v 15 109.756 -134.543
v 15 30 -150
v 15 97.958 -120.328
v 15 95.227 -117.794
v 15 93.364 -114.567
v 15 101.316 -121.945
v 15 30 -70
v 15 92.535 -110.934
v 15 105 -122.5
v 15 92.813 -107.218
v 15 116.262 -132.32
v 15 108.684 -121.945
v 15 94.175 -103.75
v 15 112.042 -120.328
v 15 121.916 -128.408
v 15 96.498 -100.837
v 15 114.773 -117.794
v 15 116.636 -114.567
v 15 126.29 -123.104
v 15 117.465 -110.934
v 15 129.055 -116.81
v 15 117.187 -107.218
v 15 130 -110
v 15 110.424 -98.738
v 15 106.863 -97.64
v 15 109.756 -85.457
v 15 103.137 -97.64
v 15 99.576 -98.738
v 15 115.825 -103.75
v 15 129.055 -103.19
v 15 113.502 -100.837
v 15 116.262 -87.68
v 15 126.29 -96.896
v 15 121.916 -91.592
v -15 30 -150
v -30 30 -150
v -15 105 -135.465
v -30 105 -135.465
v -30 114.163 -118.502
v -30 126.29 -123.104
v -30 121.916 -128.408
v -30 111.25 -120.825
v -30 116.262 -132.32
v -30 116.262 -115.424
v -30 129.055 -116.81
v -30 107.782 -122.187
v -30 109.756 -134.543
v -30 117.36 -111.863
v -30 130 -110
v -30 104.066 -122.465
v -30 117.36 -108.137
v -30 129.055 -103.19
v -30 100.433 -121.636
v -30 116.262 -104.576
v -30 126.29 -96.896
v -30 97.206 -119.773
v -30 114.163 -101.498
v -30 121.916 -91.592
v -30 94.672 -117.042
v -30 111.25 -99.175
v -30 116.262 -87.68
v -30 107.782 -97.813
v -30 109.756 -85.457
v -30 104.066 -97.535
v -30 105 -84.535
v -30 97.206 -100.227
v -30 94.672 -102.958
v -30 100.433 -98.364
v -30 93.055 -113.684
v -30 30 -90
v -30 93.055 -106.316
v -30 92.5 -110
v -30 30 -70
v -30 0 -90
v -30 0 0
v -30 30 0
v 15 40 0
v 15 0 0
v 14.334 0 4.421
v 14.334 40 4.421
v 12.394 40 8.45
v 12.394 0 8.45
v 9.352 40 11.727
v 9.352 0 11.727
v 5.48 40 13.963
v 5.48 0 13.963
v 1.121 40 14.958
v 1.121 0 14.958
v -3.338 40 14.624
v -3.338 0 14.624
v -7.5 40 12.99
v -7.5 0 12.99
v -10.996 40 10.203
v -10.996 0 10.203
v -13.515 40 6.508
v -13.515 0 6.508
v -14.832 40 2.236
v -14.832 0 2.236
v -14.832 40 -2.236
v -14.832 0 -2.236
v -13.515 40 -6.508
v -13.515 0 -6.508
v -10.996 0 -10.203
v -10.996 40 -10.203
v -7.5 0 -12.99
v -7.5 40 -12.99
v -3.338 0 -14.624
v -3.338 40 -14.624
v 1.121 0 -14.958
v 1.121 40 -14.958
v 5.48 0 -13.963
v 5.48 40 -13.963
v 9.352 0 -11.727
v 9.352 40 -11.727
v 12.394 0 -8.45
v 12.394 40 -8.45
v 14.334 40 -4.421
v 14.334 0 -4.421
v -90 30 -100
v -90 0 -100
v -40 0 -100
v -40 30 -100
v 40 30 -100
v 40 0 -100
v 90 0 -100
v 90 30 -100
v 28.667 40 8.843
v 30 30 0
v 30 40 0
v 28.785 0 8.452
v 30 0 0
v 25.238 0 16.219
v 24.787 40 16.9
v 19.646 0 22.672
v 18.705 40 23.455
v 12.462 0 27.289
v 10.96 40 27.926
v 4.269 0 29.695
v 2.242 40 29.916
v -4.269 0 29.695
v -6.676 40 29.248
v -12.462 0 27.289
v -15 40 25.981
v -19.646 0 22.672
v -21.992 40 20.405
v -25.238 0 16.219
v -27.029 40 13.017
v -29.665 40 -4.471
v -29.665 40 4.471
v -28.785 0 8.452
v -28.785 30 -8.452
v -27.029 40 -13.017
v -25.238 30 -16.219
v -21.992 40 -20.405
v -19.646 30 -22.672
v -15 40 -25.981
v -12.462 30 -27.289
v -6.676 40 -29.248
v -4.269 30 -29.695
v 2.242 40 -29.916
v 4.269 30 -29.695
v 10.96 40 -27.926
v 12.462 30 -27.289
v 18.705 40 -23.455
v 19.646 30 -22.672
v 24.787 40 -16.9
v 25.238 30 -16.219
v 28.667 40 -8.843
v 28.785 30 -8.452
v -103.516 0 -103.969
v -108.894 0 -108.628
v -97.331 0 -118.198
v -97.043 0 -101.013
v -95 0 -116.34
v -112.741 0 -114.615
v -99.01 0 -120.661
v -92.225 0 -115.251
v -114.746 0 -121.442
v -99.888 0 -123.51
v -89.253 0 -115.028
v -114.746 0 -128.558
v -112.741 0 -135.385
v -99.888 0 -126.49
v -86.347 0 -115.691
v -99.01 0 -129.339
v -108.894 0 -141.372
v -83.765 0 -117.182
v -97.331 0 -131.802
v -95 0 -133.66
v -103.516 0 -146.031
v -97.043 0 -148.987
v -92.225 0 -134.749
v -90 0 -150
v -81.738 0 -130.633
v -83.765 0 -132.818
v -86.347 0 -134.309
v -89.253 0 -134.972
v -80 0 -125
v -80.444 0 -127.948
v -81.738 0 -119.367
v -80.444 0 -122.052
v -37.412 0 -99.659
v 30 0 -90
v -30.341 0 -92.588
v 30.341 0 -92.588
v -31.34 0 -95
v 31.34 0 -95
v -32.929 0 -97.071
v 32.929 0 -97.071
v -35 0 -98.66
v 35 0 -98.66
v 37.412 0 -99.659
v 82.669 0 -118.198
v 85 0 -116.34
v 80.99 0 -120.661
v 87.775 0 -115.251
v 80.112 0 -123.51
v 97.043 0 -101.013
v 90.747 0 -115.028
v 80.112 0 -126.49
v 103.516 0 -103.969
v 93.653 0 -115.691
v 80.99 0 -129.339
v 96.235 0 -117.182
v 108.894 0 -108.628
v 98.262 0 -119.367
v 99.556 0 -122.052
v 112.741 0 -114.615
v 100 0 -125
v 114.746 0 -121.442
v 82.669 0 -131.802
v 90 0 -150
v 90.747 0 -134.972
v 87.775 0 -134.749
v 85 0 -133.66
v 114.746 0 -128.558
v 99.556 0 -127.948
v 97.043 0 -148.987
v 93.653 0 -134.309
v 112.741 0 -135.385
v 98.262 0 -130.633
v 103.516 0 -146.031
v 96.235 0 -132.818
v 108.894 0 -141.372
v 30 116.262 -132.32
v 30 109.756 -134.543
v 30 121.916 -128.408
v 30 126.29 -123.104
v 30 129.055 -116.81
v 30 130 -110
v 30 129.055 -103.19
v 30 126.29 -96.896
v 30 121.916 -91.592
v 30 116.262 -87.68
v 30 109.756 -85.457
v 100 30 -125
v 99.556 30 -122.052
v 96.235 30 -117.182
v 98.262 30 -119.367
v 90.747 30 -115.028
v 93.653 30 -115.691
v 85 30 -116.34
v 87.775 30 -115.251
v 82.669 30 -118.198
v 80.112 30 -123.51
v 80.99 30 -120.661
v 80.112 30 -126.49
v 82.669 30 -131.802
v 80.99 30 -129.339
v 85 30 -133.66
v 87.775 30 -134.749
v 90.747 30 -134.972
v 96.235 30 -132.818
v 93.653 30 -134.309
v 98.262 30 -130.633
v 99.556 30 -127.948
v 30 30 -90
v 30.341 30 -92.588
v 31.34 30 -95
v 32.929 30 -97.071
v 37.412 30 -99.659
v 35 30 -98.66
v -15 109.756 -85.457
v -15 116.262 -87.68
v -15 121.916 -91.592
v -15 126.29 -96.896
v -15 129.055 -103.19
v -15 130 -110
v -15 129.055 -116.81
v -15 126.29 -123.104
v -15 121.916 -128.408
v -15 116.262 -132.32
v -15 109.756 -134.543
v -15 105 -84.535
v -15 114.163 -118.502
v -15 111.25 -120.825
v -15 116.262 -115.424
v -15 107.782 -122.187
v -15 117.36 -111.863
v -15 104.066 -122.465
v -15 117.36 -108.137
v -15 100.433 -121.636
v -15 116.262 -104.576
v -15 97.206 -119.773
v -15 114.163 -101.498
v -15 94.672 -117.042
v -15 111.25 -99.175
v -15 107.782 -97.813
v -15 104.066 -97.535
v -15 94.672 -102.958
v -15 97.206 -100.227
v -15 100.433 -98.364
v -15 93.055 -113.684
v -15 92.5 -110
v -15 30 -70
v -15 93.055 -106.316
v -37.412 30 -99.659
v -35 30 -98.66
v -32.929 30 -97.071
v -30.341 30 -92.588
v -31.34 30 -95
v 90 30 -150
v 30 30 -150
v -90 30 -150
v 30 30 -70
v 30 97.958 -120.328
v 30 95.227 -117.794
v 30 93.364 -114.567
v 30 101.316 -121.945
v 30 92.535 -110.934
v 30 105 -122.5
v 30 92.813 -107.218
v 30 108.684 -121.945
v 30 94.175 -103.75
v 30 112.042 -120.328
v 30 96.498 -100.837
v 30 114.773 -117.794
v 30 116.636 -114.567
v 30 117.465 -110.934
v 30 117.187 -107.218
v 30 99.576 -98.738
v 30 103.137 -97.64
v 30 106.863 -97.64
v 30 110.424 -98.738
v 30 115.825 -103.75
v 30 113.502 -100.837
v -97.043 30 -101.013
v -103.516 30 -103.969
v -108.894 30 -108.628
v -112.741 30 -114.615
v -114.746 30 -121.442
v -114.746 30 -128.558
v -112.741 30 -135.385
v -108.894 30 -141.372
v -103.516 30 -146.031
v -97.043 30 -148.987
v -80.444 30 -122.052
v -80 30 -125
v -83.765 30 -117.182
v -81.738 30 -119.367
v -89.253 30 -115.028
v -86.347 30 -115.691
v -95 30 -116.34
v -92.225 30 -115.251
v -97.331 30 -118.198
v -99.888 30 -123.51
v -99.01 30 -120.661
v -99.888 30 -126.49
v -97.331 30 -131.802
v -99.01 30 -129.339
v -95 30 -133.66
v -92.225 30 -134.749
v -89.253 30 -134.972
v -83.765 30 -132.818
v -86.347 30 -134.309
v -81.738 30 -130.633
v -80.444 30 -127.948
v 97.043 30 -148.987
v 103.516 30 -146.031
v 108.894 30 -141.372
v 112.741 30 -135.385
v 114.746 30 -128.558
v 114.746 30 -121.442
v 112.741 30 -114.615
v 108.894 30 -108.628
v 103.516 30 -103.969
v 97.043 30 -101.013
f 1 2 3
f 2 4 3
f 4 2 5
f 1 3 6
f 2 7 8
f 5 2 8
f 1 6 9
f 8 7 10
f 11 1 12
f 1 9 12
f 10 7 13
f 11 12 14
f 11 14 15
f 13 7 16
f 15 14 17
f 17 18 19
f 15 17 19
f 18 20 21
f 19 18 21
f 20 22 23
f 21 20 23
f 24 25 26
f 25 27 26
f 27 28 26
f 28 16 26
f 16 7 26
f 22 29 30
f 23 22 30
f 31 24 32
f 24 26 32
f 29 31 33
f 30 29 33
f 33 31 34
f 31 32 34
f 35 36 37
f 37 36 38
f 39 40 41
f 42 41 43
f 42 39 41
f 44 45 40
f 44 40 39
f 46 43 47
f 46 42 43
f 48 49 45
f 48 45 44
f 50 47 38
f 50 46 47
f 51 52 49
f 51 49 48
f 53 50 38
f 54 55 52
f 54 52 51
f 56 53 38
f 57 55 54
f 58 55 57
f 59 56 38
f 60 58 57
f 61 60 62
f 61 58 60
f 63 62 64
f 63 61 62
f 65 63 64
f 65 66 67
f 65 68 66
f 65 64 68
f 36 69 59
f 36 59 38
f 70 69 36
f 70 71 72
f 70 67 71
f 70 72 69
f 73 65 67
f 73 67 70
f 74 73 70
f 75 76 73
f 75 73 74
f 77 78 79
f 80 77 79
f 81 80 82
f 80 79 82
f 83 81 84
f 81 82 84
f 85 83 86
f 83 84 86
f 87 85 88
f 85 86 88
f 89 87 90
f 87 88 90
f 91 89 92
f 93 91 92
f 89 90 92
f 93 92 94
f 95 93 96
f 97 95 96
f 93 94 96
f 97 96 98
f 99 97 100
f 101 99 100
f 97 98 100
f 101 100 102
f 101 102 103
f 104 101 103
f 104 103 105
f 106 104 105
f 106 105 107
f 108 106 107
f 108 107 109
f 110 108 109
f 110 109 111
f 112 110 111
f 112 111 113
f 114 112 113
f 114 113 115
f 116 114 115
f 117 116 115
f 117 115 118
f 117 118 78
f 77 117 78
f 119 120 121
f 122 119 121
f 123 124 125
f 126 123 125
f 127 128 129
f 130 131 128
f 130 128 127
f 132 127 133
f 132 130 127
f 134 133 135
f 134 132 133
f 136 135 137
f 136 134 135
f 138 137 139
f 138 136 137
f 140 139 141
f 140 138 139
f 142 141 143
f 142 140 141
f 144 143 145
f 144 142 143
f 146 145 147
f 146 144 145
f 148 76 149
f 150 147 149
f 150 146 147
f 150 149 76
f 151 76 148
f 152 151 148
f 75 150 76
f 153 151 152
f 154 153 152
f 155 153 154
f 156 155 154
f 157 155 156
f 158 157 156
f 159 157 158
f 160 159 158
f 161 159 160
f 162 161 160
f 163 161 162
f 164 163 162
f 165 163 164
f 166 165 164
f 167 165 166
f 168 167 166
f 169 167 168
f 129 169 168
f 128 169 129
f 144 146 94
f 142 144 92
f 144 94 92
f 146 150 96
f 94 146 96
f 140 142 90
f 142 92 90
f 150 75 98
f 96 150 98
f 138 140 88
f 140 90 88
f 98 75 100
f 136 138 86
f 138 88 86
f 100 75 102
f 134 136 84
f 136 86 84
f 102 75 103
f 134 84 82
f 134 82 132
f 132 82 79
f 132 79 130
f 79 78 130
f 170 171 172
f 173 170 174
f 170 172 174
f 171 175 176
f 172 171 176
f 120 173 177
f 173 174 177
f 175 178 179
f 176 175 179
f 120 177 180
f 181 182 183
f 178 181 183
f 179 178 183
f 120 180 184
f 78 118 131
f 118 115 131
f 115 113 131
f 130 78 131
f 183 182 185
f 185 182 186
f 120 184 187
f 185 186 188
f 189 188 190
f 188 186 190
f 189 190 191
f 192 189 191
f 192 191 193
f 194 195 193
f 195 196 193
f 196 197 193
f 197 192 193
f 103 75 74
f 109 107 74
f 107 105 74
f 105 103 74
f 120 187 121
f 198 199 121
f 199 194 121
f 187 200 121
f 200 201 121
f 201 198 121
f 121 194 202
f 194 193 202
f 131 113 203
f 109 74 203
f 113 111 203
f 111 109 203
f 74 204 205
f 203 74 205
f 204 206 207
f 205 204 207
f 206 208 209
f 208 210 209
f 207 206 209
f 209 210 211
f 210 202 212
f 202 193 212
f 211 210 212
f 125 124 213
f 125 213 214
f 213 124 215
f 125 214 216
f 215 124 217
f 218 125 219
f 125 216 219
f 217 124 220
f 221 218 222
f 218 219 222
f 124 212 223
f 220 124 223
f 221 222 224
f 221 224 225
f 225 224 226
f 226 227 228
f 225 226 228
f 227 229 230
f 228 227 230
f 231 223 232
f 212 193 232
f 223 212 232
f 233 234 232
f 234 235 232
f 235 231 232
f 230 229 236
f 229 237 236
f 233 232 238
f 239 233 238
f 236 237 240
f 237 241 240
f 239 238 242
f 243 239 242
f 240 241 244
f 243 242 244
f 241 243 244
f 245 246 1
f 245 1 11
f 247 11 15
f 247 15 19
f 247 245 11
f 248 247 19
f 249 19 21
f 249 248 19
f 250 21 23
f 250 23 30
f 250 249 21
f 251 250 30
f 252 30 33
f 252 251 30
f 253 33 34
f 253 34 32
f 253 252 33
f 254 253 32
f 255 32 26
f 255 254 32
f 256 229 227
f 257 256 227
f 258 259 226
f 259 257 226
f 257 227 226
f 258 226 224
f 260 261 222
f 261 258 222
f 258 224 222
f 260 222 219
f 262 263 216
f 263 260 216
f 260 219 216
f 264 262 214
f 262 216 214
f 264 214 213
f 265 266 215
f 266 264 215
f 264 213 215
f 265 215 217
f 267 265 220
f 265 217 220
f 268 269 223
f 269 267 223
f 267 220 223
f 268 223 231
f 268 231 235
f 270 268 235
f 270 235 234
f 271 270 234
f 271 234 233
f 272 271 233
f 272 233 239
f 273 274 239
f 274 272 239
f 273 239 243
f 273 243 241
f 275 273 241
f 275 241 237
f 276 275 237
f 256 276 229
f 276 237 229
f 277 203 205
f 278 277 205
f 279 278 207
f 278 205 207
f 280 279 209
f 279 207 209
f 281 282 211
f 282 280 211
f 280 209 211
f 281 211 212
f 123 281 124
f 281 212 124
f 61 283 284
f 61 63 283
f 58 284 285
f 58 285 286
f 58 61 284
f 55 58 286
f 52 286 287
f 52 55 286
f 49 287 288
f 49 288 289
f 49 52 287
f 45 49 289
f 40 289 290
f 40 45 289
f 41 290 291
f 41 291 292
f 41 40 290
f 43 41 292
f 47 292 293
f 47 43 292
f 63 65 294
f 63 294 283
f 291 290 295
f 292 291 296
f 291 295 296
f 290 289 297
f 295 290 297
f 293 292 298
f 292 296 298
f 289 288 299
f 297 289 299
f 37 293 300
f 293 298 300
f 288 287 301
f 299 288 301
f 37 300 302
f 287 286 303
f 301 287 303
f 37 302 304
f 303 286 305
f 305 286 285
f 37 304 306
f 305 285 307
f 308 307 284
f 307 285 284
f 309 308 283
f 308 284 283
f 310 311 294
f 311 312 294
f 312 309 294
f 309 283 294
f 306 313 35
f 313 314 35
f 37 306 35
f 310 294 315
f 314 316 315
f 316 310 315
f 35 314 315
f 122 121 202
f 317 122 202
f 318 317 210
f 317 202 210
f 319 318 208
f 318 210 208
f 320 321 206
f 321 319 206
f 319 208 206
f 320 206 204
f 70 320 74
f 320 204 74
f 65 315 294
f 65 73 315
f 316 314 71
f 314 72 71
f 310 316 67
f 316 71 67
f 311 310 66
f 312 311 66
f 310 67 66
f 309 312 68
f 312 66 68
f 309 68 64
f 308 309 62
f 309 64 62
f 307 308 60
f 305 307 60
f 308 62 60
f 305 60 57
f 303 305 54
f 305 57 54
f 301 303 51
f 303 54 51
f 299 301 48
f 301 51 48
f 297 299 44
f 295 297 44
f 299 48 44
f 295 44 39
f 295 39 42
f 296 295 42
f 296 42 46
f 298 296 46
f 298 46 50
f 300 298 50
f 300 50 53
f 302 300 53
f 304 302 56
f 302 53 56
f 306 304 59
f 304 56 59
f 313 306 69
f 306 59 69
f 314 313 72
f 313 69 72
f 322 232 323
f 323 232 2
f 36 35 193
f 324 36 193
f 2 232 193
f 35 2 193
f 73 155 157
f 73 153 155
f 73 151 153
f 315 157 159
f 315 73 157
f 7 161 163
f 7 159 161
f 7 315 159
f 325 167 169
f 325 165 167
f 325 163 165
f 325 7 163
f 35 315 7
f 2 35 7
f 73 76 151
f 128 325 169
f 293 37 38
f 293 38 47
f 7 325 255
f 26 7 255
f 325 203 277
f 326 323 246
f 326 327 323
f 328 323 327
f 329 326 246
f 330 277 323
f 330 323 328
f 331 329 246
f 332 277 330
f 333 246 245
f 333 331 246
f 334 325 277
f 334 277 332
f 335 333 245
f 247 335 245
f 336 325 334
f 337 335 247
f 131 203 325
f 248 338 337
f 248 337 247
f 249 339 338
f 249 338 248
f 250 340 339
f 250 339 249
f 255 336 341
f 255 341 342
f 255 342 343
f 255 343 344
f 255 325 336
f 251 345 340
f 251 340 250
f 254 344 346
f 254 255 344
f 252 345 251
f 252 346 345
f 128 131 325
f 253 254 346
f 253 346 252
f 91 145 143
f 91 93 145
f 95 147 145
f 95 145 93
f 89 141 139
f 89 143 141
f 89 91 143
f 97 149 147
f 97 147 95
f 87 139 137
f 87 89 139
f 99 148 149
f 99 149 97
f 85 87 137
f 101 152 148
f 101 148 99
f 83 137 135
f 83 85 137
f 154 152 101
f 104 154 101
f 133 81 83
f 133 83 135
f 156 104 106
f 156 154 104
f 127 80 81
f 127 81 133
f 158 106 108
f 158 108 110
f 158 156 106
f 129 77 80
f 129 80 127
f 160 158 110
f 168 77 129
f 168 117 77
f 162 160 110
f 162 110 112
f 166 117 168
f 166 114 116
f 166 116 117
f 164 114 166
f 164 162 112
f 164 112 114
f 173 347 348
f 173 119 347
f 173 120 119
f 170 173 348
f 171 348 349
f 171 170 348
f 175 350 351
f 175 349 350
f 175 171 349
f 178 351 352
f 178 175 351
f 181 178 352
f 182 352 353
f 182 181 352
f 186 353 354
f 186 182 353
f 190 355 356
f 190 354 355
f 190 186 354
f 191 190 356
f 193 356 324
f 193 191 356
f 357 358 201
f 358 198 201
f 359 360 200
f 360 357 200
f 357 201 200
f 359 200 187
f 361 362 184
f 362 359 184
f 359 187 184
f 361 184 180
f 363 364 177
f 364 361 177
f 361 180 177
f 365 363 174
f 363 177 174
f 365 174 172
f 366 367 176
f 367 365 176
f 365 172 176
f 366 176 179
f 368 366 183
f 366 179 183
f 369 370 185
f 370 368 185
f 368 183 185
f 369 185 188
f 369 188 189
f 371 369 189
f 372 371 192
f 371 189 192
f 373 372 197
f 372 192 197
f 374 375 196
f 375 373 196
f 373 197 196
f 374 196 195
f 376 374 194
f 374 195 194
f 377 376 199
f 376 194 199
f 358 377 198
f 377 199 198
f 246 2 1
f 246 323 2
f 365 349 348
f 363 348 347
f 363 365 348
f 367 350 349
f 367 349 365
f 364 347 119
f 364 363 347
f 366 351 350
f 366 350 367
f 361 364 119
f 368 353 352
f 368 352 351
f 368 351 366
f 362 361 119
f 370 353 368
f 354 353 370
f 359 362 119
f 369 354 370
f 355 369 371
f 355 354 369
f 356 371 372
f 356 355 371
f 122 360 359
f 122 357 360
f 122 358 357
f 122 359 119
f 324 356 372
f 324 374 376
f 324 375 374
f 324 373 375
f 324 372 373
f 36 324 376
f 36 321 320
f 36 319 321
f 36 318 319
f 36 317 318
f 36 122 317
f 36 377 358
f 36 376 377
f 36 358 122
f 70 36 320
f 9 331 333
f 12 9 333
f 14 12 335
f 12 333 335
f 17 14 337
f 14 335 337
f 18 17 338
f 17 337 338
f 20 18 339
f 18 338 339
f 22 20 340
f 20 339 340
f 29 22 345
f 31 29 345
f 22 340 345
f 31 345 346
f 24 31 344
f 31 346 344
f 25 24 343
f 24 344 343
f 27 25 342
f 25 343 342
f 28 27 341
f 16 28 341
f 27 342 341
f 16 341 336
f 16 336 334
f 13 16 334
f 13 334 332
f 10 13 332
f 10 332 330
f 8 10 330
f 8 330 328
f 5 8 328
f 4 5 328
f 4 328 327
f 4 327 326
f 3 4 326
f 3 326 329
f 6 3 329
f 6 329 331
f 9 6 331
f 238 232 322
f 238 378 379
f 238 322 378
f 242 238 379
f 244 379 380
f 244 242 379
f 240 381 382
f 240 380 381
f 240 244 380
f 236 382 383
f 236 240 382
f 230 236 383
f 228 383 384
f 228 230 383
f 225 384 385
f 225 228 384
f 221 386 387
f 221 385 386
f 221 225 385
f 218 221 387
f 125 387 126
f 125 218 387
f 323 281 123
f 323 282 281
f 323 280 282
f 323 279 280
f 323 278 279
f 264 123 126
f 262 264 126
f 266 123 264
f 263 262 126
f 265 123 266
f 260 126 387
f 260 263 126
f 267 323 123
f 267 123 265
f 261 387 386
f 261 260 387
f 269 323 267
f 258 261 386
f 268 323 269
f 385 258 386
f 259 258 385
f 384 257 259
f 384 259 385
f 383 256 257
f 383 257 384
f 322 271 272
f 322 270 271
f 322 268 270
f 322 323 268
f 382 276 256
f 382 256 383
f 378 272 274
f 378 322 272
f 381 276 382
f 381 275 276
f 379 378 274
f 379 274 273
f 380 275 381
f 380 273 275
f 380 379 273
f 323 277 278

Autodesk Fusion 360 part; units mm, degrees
sketch "Sketch2" plane through (0, 0, 0) normal (0, 1, 0) x (1, 0, 0)
  line L0 (-30, 0) -> (-30, 90)
  line L1 (30, 100) -> (30, 150)
  line L2 (30, 150) -> (90, 150)
  line L3 (30, 150) -> (-90, 150)
  line L4 (-90, 100) -> (-40, 100)
  arc A0 (-30, 90) -> (-40, 100) centre (-40, 90) ccw
  line L5 (40, 100) -> (90, 100)
  arc A1 (-30, 0) -> (30, 0) centre (0, 0) ccw
  arc A2 (30, 0) -> (-30, 0) centre (0, 0) ccw
  arc A3 (-15, 0) -> (15, 0) centre (0, 0) ccw
  arc A4 (15, 0) -> (-15, 0) centre (0, 0) ccw
  line L6 (30, 0) -> (30, 90)
  arc A5 (90, 100) -> (90, 150) centre (90, 125) ccw
  arc A6 (-90, 150) -> (-90, 100) centre (-90, 125) ccw
  arc A7 (40, 100) -> (30, 90) centre (40, 90) ccw
  circle A8 centre (-90, 125) radius 10
  circle A9 centre (90, 125) radius 10
  point P0 (-30, 150)
  dimension "d1" = 150
  dimension "d2" = 60
  dimension "d3" = 60
  dimension "d4" = 120
  dimension "d5" = 30
  dimension "d6" = 25
  dimension "d7" = 25
  dimension "d8" = 25
  dimension "d9" = 10
  dimension "d10" = 10
  dimension "d11" = 20
  dimension "d12" = 20
extrude "Extrude1" add sketch "Sketch2" along normal blind 40 contours A1 A2
extrude "Extrude2" add sketch "Sketch2" along normal blind 30 contours L0 L2 L3 L4 A0 L5 A2 L6 A5 A6 A7
sketch "Sketch3" plane through (0, 30, 0) normal (0, 1, 0) x (-1, 0, 0)
  circle A0 centre (-90, -125) radius 10
  circle A1 centre (90, -125) radius 10
  arc A2 (-90, -100) -> (-90, -150) centre (-90, -125) ccw
  line L0 (-90, -150) -> (90, -150)
  arc A3 (90, -150) -> (90, -100) centre (90, -125) ccw
  line L1 (90, -100) -> (40, -100)
  arc A4 (30, -90) -> (40, -100) centre (40, -90) ccw
  line L2 (30, -90) -> (30, 0)
  arc A5 (-30, 0) -> (30, 0) centre (0, 0) ccw
  line L3 (-30, 0) -> (-30, -90)
  arc A6 (-40, -100) -> (-30, -90) centre (-40, -90) ccw
  line L4 (-40, -100) -> (-90, -100)
sketch "Sketch4" plane through (30, 0, 0) normal (1, 0, 0) x (0, 1, 0)
  line L0 (0, 0) -> (0, -90)
  line L1 (0, -90) -> (30, -90)
  line L2 (30, -90) -> (30, 0)
  line L3 (30, 0) -> (0, 0)
  line L4 (30, -150) -> (30, -70)
  line L5 (105, -84.5349) -> (105, -85)
  arc A0 (109.7565, -134.5434) -> (109.7565, -85.4566) centre (105, -110) ccw
  arc A1 (105, -122.5) -> (105, -97.5) centre (105, -110) ccw
  arc A2 (105, -97.5) -> (105, -122.5) centre (105, -110) ccw
  line L6 (30, -70) -> (109.7565, -85.4566)
  line L7 (30, -150) -> (109.7565, -134.5434)
  dimension "d17" = 80
  dimension "d20" = 25
  dimension "d24" = 0
  dimension "d25" = 0
extrude "Extrude3" add sketch "Sketch4" against normal blind 15 contours L2 L4 A0 L6 L7
sketch "Sketch7" plane through (-30, 0, 0) normal (-1, 0, 0) x (0, -1, 0)
  line L0 (0, -90) -> (0, 0)
  line L1 (0, 0) -> (-30, 0)
  line L2 (-30, 0) -> (-30, -90)
  line L3 (-30, -90) -> (0, -90)
  line L4 (-30, -70) -> (-30, -150)
  circle A0 centre (-105, -110) radius 12.5
  line L5 (-105, -84.5349) -> (-109.7565, -85.4566)
  line L6 (-105, -135.4651) -> (-109.7565, -134.5434)
  line L7 (-30, -150) -> (-105, -135.4651)
  line L8 (-30, -70) -> (-105, -84.5349)
  arc A1 (-109.7565, -85.4566) -> (-109.7565, -134.5434) centre (-105, -110) ccw
  dimension "d29" = 25
extrude "Extrude4" add sketch "Sketch7" against normal blind 15 contours L2 L4 L5 L6 L7 L8 A1
